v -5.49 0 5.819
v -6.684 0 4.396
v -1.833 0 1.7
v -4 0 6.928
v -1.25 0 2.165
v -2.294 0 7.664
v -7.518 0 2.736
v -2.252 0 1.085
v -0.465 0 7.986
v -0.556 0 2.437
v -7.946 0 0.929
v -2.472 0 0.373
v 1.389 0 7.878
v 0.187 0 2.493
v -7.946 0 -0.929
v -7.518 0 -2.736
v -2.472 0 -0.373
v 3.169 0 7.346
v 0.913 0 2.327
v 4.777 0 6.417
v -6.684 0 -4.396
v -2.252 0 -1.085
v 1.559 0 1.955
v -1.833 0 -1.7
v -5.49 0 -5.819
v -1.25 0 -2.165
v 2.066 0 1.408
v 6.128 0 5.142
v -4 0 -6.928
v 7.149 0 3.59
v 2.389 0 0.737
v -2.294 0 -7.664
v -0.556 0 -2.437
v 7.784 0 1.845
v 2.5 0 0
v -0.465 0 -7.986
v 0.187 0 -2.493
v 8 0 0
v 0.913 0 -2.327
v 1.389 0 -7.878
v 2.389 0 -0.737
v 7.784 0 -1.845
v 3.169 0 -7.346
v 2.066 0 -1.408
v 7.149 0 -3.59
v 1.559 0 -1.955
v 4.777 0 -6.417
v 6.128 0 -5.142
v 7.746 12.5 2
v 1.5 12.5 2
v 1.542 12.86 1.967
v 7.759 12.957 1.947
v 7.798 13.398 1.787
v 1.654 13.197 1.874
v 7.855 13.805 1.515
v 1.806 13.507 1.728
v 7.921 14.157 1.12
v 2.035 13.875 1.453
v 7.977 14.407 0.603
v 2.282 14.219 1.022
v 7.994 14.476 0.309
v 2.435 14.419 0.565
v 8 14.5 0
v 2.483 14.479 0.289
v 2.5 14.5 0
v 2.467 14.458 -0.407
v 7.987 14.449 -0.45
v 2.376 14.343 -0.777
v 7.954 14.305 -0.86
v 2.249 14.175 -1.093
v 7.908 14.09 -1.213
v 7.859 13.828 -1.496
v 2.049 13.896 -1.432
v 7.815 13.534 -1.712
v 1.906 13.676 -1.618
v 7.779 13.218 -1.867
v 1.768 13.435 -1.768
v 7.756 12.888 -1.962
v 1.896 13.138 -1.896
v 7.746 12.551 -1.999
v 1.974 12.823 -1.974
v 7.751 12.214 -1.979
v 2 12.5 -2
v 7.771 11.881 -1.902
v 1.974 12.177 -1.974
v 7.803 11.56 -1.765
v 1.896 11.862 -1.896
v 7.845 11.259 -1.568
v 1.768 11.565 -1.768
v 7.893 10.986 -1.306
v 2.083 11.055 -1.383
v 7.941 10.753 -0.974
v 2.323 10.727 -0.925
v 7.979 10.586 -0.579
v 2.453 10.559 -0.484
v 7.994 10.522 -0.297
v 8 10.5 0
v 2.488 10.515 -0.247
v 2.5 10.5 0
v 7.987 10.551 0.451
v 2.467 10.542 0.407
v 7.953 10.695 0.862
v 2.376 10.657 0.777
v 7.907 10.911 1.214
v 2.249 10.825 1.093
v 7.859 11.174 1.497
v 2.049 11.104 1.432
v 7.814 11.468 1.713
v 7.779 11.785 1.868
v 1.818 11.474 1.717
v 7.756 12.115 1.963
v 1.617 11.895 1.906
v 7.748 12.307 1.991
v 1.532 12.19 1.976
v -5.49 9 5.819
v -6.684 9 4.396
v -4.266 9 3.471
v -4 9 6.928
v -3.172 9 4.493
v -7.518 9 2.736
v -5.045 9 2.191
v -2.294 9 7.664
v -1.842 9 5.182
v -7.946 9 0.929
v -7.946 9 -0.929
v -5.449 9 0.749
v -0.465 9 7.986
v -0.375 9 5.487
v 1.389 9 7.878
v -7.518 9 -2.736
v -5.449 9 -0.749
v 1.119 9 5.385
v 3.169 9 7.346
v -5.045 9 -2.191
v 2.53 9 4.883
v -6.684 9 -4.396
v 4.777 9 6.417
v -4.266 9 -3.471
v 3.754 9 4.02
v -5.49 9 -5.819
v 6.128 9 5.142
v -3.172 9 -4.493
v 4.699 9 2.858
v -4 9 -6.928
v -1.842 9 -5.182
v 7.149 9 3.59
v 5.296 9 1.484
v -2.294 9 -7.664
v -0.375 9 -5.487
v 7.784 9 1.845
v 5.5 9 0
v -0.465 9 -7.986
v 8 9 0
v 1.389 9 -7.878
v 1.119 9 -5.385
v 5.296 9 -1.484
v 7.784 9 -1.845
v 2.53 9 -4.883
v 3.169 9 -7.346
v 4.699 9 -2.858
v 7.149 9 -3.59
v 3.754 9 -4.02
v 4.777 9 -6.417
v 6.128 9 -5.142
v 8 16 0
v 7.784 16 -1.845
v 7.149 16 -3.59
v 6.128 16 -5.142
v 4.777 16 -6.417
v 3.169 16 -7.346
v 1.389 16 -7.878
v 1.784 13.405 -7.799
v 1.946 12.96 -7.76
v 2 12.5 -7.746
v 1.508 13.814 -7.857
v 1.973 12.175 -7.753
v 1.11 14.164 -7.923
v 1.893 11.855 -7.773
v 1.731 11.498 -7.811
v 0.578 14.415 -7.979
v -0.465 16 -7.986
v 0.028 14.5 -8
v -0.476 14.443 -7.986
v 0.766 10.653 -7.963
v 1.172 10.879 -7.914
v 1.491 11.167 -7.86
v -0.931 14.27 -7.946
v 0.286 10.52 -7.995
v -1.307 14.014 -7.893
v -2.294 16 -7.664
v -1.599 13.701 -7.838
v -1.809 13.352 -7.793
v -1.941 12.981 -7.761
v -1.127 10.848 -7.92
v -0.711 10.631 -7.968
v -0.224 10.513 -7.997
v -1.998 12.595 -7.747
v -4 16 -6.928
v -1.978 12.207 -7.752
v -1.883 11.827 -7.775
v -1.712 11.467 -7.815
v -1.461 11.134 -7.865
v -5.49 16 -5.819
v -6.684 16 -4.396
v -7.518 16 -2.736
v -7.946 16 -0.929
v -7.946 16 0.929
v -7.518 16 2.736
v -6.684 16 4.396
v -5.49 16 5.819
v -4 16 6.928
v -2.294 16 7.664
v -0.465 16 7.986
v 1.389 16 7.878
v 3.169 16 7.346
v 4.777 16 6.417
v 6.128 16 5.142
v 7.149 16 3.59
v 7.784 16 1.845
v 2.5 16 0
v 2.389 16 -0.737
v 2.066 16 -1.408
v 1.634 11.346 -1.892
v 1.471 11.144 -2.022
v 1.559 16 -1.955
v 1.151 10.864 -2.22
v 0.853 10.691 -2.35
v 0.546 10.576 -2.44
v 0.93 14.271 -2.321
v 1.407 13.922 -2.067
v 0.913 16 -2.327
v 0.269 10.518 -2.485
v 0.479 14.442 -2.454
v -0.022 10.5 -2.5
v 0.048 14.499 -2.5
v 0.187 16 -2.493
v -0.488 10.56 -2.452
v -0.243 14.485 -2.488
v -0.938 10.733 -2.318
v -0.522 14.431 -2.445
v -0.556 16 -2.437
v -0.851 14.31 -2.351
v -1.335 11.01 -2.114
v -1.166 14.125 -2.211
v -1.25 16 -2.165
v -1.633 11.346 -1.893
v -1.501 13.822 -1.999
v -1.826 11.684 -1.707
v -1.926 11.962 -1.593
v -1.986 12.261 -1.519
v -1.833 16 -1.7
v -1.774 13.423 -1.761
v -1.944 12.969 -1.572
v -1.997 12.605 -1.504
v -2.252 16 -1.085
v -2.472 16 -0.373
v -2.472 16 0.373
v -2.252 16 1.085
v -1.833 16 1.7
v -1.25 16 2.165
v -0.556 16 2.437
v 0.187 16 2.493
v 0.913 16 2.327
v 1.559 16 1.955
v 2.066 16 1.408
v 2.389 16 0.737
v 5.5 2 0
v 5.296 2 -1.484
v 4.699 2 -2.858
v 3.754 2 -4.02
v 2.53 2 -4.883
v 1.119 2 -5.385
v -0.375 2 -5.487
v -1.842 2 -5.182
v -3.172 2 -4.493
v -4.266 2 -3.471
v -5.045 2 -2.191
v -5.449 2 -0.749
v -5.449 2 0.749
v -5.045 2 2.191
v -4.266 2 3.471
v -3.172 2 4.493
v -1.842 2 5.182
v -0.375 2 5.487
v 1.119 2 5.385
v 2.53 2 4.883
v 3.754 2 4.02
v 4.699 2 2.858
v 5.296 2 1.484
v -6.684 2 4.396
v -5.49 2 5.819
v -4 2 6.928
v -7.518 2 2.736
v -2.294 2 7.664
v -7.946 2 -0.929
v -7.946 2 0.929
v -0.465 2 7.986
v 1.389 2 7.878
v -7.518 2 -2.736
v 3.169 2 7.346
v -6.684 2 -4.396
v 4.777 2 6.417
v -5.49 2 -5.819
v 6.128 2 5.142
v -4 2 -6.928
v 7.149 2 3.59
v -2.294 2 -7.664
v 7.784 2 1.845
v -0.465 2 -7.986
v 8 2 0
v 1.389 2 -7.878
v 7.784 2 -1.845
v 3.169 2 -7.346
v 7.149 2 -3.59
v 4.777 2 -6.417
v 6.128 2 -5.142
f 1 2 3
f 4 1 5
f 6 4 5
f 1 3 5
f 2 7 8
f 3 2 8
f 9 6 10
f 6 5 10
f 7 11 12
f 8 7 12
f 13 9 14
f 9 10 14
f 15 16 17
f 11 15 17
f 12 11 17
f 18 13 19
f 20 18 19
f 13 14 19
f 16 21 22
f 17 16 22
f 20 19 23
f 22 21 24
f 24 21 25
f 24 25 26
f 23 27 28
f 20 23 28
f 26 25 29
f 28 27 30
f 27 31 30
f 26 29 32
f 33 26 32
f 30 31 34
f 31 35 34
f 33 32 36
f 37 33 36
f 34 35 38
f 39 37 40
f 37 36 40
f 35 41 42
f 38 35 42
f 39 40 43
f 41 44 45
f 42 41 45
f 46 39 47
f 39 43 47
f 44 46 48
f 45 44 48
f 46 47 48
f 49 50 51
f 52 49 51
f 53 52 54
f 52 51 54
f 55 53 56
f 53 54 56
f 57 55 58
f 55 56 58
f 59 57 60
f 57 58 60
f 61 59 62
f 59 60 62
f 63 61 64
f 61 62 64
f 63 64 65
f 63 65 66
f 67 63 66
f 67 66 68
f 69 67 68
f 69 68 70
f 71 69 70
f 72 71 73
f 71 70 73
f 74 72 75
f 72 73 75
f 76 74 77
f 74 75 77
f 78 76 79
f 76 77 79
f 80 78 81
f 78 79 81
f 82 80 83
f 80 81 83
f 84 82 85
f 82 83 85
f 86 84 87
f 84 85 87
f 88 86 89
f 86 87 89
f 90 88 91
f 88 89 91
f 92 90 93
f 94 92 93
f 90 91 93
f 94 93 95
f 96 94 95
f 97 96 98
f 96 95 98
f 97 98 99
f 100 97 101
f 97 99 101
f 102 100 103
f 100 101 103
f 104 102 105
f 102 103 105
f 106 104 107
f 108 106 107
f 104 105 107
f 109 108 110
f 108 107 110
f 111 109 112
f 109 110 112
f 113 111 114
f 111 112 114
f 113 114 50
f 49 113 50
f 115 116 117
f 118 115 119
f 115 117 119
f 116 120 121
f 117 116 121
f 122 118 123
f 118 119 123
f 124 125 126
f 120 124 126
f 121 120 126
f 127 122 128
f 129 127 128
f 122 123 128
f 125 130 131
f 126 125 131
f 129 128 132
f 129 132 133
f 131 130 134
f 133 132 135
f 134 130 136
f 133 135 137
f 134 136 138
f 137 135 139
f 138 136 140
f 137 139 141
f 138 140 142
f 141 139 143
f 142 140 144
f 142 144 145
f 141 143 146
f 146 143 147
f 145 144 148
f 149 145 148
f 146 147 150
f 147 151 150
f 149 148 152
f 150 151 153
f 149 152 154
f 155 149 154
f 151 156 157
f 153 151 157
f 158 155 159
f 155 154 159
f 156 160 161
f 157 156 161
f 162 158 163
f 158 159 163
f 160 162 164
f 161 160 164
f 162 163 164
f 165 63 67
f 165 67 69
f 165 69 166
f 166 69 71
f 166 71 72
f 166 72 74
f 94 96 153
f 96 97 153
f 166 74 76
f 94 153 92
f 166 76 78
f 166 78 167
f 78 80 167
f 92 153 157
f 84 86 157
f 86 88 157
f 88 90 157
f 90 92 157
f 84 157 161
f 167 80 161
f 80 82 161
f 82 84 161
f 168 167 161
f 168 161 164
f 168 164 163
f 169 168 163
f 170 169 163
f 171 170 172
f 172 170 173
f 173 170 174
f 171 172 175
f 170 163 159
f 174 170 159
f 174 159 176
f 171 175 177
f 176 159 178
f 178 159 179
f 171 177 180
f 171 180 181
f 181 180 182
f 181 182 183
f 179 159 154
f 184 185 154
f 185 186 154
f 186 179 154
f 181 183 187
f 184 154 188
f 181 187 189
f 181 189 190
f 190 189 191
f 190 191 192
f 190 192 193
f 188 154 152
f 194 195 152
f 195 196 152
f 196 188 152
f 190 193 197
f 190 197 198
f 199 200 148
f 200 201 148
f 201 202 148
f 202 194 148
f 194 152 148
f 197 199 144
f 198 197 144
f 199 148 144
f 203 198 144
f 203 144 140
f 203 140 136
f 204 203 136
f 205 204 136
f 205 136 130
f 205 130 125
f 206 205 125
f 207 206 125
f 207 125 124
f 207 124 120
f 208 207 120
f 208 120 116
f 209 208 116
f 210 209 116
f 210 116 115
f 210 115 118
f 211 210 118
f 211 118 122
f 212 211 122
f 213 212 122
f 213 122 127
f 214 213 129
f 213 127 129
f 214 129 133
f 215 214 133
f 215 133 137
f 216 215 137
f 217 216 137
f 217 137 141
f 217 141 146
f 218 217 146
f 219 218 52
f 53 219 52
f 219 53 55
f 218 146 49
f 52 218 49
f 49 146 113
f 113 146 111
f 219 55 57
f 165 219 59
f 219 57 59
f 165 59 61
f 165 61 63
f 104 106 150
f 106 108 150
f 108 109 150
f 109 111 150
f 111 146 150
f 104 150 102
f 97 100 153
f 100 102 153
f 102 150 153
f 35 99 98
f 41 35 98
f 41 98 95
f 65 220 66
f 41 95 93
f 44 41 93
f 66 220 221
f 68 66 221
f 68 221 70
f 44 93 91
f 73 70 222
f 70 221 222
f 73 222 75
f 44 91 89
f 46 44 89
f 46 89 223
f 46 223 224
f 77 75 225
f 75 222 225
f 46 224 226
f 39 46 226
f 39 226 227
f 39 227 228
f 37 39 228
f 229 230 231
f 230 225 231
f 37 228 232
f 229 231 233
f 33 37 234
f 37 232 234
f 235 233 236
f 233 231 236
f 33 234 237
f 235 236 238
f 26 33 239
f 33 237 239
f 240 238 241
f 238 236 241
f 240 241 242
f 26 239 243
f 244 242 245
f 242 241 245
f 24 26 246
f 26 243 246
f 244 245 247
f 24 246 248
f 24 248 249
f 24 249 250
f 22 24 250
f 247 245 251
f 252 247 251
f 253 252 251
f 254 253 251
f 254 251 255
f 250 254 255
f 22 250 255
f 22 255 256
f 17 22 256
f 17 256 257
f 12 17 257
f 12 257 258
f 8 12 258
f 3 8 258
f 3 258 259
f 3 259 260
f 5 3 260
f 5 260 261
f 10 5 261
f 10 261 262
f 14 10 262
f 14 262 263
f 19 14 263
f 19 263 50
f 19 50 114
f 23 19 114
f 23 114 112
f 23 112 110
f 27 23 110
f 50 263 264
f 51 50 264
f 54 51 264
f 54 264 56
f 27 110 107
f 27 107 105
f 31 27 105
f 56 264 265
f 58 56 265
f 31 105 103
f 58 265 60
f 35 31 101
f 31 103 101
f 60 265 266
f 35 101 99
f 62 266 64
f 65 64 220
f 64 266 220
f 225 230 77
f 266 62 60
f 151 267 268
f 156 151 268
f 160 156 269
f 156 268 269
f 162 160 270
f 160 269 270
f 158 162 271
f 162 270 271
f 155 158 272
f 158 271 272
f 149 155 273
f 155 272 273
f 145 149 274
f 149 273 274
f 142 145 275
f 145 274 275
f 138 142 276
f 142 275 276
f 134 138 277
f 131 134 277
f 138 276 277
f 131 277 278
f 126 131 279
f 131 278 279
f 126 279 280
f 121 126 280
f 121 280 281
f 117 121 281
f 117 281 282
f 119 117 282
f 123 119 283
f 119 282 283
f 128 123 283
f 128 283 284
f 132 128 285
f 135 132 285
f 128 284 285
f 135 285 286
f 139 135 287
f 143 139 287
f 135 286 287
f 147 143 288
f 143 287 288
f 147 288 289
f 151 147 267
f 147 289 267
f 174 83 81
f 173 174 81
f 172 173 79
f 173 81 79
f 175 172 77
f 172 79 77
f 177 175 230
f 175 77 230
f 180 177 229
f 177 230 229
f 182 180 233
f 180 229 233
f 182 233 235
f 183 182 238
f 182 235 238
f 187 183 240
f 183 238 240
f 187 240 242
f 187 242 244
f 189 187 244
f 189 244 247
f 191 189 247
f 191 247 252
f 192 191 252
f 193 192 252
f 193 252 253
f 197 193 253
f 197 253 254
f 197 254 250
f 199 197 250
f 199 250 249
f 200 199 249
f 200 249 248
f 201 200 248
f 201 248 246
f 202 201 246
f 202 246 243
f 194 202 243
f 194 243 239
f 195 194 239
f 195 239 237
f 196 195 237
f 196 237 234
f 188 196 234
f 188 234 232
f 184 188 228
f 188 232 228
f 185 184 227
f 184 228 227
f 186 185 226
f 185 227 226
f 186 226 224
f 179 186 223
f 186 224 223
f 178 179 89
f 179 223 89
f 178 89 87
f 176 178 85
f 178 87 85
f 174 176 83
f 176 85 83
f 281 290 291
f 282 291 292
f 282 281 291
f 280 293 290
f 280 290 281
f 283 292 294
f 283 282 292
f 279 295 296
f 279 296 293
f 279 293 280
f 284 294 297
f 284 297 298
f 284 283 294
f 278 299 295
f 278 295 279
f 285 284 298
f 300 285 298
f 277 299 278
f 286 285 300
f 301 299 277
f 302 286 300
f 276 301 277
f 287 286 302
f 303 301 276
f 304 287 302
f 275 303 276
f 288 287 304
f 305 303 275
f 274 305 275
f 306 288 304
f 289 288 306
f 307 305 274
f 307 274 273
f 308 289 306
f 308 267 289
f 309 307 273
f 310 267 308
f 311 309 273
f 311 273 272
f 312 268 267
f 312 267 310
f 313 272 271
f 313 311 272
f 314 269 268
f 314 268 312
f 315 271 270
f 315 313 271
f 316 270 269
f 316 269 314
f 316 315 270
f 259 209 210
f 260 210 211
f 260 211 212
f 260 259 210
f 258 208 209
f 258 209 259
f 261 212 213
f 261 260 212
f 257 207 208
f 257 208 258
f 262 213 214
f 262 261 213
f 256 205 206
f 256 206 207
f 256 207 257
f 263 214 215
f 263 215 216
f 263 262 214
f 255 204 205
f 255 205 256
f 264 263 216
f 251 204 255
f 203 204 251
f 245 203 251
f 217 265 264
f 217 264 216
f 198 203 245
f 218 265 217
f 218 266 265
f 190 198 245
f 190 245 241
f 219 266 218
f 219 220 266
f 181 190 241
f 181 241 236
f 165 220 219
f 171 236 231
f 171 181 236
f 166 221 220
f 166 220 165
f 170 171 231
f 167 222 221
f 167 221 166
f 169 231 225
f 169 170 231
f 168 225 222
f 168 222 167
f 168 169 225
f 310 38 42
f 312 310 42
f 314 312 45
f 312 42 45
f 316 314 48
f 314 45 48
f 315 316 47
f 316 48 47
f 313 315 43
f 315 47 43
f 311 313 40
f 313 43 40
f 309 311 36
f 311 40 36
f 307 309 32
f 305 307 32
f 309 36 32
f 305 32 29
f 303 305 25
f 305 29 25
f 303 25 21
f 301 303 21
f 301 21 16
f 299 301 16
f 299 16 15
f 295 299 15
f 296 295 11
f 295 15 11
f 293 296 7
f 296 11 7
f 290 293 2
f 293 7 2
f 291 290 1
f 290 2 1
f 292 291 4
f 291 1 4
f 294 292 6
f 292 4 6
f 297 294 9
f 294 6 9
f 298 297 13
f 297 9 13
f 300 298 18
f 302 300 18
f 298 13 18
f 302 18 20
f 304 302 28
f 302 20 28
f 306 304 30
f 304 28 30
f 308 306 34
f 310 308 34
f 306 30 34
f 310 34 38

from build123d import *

# Parameters (mm, degrees)
SKETCH1_R           = 8
BOSS_EXTRUDE1_DEPTH = 2
SKETCH2_R           = 5.5
BOSS_EXTRUDE2_DEPTH = 7
SKETCH3_R           = 8
BOSS_EXTRUDE3_DEPTH = 7
SKETCH4_R           = 2.5
CUT_EXTRUDE2_DEPTH  = 17
SKETCH7_R           = 2
CUT_EXTRUDE3_DEPTH  = 9
CIRPATTERN1_COUNT   = 2
CIRPATTERN1_ANGLE   = 90


with BuildPart() as part:
    # Sketch1 → Boss-Extrude1 (new body)
    with BuildSketch(Plane(origin=(0, 0, 0), x_dir=(1, 0, 0), z_dir=(0, 1, 0))):
        Circle(SKETCH1_R)
    extrude(amount=BOSS_EXTRUDE1_DEPTH)

    # Sketch2 → Boss-Extrude2 (add)
    with BuildSketch(Plane(origin=(0, 2, 0), x_dir=(1, 0, 0), z_dir=(0, 1, 0))):
        Circle(SKETCH2_R)
    extrude(amount=BOSS_EXTRUDE2_DEPTH)

    # Sketch3 → Boss-Extrude3 (add)
    with BuildSketch(Plane(origin=(0, 9, 0), x_dir=(1, 0, 0), z_dir=(0, 1, 0))):
        Circle(SKETCH3_R)
    extrude(amount=BOSS_EXTRUDE3_DEPTH)

    # Sketch4 → Cut-Extrude2 (cut, through all)
    with BuildSketch(Plane(origin=(0, 16, 0), x_dir=(1, 0, 0), z_dir=(0, 1, 0))):
        Circle(SKETCH4_R)
    extrude(amount=-CUT_EXTRUDE2_DEPTH, mode=Mode.SUBTRACT)

    # Sketch7 → Cut-Extrude3 (cut, through all)
    with BuildSketch(Plane.XY):
        with Locations((0, 12.5)):
            Circle(SKETCH7_R)
    cut_extrude3 = extrude(amount=-CUT_EXTRUDE3_DEPTH, mode=Mode.SUBTRACT)

    # CirPattern1: Cut-Extrude3 ×2 about axis
    cirpattern1_axis = Axis((0, 16, 0), (0, -1, 0))
    for i in range(1, CIRPATTERN1_COUNT):
        add(cut_extrude3.rotate(cirpattern1_axis, i * CIRPATTERN1_ANGLE / (CIRPATTERN1_COUNT - 1)), mode=Mode.SUBTRACT)


solid = part.part
